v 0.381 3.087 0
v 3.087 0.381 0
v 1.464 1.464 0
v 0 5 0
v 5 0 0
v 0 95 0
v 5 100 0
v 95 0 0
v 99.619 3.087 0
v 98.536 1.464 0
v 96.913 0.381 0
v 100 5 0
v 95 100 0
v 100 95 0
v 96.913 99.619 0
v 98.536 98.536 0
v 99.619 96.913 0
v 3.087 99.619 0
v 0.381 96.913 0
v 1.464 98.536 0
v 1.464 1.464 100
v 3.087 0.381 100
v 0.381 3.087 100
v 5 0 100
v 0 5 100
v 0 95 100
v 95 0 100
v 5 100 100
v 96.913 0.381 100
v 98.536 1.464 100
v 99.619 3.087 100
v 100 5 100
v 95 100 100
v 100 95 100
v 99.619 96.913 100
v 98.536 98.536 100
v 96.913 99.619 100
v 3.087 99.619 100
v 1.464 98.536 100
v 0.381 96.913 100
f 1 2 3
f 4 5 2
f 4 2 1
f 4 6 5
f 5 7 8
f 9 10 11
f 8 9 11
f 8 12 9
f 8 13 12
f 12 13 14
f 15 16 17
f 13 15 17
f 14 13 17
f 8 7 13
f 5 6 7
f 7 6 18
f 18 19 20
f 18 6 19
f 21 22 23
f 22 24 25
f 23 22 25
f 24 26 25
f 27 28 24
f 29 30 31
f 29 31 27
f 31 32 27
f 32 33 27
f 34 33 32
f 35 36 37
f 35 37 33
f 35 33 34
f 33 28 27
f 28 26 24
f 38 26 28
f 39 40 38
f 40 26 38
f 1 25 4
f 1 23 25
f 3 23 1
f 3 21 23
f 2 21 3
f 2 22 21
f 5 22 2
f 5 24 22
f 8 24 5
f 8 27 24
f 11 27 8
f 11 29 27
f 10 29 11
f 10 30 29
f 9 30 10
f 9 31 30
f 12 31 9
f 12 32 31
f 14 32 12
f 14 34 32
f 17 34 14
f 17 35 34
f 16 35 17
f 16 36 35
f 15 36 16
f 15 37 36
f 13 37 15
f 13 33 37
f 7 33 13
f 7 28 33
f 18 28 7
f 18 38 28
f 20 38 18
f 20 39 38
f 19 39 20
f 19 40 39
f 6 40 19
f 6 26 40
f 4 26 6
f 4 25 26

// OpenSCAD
// Shapes for modules.scad, brought in by `use`: only its modules and
// functions count, not what it makes itself.

corner_fn = 16;

module rounded_plate(size, r) {
    linear_extrude(height = size.z)
        offset_square([size.x, size.y], r);
}

module offset_square(size, r) {
    hull() for (x = [r, size.x - r], y = [r, size.y - r]) translate([x, y]) circle(r, $fn = corner_fn);
}

// Made when the file is opened alone, not when used.
rounded_plate([100, 100, 100], 5);
